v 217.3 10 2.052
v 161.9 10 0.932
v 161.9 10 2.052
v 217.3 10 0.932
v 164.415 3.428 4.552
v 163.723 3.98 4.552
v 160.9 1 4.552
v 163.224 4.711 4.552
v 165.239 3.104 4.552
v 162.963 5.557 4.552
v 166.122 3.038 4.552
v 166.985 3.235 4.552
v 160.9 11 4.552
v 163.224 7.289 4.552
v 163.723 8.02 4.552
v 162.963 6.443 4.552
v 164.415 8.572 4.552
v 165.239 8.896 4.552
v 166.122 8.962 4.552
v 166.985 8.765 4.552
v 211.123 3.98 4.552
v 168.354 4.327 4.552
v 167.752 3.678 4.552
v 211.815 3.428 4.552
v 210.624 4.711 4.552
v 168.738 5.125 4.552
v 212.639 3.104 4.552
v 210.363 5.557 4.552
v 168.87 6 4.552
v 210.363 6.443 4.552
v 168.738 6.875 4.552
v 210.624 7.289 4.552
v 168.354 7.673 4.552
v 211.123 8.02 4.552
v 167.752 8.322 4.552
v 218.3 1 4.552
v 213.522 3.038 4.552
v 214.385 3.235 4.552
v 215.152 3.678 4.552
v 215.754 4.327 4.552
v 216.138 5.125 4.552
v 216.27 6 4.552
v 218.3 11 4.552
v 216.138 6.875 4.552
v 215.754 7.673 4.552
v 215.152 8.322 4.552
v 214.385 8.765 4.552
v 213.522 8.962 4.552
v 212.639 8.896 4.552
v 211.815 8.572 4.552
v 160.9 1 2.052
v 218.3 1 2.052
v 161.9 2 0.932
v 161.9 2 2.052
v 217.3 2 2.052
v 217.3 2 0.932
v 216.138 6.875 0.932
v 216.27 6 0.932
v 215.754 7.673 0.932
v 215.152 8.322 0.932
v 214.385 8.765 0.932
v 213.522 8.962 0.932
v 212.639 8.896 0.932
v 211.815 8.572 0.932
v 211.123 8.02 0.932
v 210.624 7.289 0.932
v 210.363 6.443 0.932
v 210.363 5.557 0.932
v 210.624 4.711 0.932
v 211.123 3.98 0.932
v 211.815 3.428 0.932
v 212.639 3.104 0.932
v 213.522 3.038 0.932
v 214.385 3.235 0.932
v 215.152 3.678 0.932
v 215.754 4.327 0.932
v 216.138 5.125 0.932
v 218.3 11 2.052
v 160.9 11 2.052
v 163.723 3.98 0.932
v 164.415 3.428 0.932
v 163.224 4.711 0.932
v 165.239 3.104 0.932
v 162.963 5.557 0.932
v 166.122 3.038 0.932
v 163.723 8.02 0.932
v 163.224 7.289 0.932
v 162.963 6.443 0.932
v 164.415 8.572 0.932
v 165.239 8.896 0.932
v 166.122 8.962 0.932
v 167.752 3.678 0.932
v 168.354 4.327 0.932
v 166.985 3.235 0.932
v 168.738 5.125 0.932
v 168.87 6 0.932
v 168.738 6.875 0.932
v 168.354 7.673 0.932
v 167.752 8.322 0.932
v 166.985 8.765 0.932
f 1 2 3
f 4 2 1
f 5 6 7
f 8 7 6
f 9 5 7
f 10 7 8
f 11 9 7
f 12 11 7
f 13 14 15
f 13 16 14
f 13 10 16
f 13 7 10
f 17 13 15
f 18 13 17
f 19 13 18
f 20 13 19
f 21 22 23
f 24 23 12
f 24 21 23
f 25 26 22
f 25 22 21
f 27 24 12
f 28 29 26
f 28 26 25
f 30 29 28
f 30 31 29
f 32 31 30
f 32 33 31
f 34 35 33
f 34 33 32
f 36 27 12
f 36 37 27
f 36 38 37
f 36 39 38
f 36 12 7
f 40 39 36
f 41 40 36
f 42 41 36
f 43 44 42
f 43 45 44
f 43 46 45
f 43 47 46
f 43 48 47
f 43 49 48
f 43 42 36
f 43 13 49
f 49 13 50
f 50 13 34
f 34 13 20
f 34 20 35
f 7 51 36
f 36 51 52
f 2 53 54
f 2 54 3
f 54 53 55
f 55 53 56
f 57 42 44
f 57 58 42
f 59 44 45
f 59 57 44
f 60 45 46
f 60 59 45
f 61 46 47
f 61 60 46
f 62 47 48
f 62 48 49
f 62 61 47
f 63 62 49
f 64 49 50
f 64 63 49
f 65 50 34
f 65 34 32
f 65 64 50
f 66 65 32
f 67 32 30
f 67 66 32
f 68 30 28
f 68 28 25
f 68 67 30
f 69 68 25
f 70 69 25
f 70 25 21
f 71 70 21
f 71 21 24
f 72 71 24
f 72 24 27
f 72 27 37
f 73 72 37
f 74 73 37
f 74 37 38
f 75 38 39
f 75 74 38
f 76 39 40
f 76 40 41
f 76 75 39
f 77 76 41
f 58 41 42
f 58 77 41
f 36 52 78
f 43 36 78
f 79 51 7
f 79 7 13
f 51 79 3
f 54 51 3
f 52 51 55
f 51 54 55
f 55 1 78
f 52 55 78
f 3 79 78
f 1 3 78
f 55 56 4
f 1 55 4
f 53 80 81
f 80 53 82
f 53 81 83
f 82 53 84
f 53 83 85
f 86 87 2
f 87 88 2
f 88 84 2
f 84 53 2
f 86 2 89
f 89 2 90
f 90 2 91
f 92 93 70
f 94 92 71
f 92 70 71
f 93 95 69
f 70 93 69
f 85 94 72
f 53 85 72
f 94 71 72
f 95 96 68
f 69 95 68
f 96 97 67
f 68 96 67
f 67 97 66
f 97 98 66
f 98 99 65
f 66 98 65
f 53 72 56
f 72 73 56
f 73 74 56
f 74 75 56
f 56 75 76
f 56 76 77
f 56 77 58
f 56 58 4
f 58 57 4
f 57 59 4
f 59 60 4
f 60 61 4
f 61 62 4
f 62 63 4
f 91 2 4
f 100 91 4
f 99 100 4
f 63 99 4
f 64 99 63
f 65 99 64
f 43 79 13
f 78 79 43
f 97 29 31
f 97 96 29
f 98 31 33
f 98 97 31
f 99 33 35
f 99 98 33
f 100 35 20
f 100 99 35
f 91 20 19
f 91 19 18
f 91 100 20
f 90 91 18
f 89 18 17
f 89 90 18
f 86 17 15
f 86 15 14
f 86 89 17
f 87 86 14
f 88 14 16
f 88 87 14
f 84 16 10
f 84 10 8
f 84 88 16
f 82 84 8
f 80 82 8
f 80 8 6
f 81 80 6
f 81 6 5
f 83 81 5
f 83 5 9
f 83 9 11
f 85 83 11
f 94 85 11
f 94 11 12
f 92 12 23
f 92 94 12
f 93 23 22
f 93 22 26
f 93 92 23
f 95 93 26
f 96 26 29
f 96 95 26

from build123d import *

# Parameters (mm, degrees)
SKETCH1_W           = 55.4
SKETCH1_H           = 8
SKETCH1_R           = 2.97
BOSS_EXTRUDE1_DEPTH = 1.12
SKETCH2_W           = 57.4
SKETCH2_H           = 10
SKETCH2_R           = 2.97
BOSS_EXTRUDE2_DEPTH = 2.5


with BuildPart() as part:
    # Sketch1 → Boss-Extrude1 (new body)
    with BuildSketch(Plane.XY.offset(0.931976945)):
        with Locations((189.6, 6)):
            Rectangle(SKETCH1_W, SKETCH1_H)
        with Locations((165.9, 6)):
            Circle(SKETCH1_R, mode=Mode.SUBTRACT)
        with Locations((213.3, 6)):
            Circle(SKETCH1_R, mode=Mode.SUBTRACT)
    extrude(amount=BOSS_EXTRUDE1_DEPTH)

    # Sketch2 → Boss-Extrude2 (add)
    with BuildSketch(Plane.XY.offset(2.051976945)):
        with Locations((189.6, 6)):
            Rectangle(SKETCH2_W, SKETCH2_H)
        with Locations((213.3, 6)):
            Circle(SKETCH2_R, mode=Mode.SUBTRACT)
        with Locations((165.9, 6)):
            Circle(SKETCH2_R, mode=Mode.SUBTRACT)
    extrude(amount=BOSS_EXTRUDE2_DEPTH)


solid = part.part
